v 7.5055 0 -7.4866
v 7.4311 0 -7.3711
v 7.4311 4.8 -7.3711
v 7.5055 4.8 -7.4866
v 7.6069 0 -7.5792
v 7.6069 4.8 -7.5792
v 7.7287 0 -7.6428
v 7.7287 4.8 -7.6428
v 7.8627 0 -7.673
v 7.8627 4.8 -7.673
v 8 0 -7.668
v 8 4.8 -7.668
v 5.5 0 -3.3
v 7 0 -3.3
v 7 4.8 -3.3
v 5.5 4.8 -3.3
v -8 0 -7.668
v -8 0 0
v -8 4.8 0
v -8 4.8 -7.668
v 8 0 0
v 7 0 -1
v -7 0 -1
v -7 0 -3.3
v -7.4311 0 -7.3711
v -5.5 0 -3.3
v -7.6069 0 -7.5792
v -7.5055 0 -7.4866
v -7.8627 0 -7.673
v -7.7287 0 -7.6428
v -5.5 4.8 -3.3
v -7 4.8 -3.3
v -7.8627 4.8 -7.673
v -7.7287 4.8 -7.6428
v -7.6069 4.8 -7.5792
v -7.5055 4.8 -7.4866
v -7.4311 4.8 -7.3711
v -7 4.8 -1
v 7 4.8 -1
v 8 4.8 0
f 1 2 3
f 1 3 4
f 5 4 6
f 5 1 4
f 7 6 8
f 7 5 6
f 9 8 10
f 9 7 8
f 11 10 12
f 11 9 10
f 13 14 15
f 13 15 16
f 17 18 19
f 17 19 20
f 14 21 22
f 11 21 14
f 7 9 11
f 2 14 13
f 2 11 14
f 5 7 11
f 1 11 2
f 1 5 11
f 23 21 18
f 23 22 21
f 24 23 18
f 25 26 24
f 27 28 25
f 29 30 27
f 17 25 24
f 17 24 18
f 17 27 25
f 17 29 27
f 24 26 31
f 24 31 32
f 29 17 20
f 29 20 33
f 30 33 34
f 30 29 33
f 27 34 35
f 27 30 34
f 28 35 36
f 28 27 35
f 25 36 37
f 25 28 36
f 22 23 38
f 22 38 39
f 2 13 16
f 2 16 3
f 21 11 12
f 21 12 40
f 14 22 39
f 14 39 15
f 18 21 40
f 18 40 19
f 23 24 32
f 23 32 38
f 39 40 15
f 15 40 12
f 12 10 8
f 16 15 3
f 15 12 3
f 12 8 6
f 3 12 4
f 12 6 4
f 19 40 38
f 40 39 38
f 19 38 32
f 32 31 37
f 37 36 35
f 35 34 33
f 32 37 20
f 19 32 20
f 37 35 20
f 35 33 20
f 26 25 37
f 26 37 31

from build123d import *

# Parameters (mm, degrees)
EXTRUDE_1_DEPTH = 4.8


with BuildPart() as part:
    # 草圖1 → 填料-伸長1 (new body)
    with BuildSketch(Plane(origin=(0, 0, 0), x_dir=(1, 0, 0), z_dir=(0, 1, 0))):
        with BuildLine():
            Line((-7, 1), (7, 1))
            Line((7, 1), (7, 3.3))
            Line((7, 3.3), (5.5, 3.3))
            Line((5.5, 3.3), (7.431056476, 7.371095386))
            ThreePointArc((7.431056476, 7.371095386), (7.665760023, 7.614923881), (8, 7.668043813))
            Line((8, 7.668043813), (8, 1))
            Line((8, 1), (8, 0))
            Line((8, 0), (-8, 0))
            Line((-8, 0), (-8, 1))
            Line((-8, 1), (-8, 7.668043813))
            ThreePointArc((-8, 7.668043813), (-7.665760023, 7.614923881), (-7.431056476, 7.371095386))
            Line((-7.431056476, 7.371095386), (-5.5, 3.3))
            Line((-5.5, 3.3), (-7, 3.3))
            Line((-7, 3.3), (-7, 1))
        make_face()
    extrude(amount=EXTRUDE_1_DEPTH)


solid = part.part
